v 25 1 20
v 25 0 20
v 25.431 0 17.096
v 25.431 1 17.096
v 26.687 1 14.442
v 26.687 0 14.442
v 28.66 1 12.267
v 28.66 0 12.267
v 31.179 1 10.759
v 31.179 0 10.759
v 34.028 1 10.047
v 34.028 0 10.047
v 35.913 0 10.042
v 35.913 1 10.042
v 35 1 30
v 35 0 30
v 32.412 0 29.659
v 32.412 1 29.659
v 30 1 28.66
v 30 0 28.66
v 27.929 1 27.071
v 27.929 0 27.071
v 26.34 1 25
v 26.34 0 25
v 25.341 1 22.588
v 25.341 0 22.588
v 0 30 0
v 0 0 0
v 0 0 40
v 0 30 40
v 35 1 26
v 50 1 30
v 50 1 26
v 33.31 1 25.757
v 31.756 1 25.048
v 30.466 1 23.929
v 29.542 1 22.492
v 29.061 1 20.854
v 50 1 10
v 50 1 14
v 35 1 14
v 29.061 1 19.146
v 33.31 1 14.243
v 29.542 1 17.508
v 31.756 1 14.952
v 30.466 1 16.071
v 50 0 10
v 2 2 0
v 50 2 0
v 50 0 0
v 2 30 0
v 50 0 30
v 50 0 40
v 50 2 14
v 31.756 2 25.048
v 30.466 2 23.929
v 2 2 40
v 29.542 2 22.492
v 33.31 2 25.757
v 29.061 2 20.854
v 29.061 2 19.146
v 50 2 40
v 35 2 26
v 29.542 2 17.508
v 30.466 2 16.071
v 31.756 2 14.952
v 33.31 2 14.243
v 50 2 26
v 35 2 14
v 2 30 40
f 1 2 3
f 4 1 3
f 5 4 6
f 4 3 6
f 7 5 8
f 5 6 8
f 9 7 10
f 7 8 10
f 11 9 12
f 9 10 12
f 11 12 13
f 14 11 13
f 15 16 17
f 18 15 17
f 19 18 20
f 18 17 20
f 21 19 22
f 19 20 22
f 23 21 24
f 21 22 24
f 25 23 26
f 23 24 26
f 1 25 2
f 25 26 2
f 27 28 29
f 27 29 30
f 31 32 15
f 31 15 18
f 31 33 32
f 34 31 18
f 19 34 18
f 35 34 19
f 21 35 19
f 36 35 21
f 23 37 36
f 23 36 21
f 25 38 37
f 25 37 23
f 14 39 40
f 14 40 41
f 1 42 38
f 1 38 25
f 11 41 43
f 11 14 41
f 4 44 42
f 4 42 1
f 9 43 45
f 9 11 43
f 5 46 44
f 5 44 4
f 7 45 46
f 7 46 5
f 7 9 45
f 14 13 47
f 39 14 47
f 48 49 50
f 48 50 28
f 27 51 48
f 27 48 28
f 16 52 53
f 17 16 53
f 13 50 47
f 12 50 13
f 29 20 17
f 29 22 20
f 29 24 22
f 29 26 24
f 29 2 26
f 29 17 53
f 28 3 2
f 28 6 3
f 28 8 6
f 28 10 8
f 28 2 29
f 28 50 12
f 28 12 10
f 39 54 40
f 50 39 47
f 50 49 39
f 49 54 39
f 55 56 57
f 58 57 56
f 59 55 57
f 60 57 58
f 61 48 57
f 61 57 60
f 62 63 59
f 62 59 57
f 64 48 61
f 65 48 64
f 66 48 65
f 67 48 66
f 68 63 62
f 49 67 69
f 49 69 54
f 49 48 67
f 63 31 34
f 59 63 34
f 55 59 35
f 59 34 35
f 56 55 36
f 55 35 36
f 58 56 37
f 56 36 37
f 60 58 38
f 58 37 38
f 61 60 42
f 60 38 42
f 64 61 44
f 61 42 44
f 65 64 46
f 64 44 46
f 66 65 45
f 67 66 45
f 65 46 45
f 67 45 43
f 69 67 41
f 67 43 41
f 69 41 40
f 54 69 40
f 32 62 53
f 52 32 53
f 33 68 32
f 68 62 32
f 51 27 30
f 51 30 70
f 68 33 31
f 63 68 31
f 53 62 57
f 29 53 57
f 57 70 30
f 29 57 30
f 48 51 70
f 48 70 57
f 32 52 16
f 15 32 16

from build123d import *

# Parameters (mm, degrees)
BOSS_EXTRUDE1_DEPTH = 40
SKETCH4_R           = 6
CUT_EXTRUDE1_DEPTH  = 71.710678119
CUT_EXTRUDE2_DEPTH  = 1


with BuildPart() as part:
    # Sketch1 → Boss-Extrude1 (new body)
    with BuildSketch(Plane.XY):
        Polygon((0, 0), (0, 30), (2, 30), (2, 2), (50, 2), (50, 0), align=None)
    extrude(amount=BOSS_EXTRUDE1_DEPTH)

    # Sketch4 → Cut-Extrude1 (cut, through all)
    with BuildSketch(Plane(origin=(0, 0, 0), x_dir=(-1, 0, 0), z_dir=(0, -1, 0))):
        with BuildLine():
            Line((-50, -26), (-35, -26))
            ThreePointArc((-35, -26), (-41, -20), (-35, -14))
            Line((-35, -14), (-50, -14))
            Line((-50, -14), (-50, -26))
        make_face()
        with Locations((-35, -20)):
            Circle(SKETCH4_R)
    extrude(amount=-CUT_EXTRUDE1_DEPTH, mode=Mode.SUBTRACT)

    # Sketch5 → Cut-Extrude2 (cut)
    with BuildSketch(Plane(origin=(0, 0, 0), x_dir=(-1, 0, 0), z_dir=(0, -1, 0))):
        with BuildLine():
            Line((-50, -30), (-35, -30))
            ThreePointArc((-35, -30), (-39.472135955, -28.94427191), (-43, -26))
            Line((-43, -26), (-50, -26))
            Line((-50, -26), (-50, -30))
        make_face()
        with BuildLine():
            Line((-50, -14), (-43, -14))
            ThreePointArc((-43, -14), (-39.876214832, -11.269448533), (-35.913040721, -10.041769402))
            Line((-35.913040721, -10.041769402), (-50, -10))
            Line((-50, -10), (-50, -14))
        make_face()
        with BuildLine():
            ThreePointArc((-43, -26), (-39.472135955, -28.94427191), (-35, -30))
            ThreePointArc((-35, -30), (-27.928932188, -27.071067812), (-25, -20))
            ThreePointArc((-25, -20), (-27.593219771, -13.281398461), (-34.027921329, -10.047358991))
            Line((-34.027921329, -10.047358991), (-35.913040721, -10.041769402))
            ThreePointArc((-35.913040721, -10.041769402), (-39.876214832, -11.269448533), (-43, -14))
            Line((-43, -14), (-35, -14))
            ThreePointArc((-35, -14), (-29, -20), (-35, -26))
            Line((-35, -26), (-43, -26))
        make_face()
    extrude(amount=-CUT_EXTRUDE2_DEPTH, mode=Mode.SUBTRACT)


solid = part.part
